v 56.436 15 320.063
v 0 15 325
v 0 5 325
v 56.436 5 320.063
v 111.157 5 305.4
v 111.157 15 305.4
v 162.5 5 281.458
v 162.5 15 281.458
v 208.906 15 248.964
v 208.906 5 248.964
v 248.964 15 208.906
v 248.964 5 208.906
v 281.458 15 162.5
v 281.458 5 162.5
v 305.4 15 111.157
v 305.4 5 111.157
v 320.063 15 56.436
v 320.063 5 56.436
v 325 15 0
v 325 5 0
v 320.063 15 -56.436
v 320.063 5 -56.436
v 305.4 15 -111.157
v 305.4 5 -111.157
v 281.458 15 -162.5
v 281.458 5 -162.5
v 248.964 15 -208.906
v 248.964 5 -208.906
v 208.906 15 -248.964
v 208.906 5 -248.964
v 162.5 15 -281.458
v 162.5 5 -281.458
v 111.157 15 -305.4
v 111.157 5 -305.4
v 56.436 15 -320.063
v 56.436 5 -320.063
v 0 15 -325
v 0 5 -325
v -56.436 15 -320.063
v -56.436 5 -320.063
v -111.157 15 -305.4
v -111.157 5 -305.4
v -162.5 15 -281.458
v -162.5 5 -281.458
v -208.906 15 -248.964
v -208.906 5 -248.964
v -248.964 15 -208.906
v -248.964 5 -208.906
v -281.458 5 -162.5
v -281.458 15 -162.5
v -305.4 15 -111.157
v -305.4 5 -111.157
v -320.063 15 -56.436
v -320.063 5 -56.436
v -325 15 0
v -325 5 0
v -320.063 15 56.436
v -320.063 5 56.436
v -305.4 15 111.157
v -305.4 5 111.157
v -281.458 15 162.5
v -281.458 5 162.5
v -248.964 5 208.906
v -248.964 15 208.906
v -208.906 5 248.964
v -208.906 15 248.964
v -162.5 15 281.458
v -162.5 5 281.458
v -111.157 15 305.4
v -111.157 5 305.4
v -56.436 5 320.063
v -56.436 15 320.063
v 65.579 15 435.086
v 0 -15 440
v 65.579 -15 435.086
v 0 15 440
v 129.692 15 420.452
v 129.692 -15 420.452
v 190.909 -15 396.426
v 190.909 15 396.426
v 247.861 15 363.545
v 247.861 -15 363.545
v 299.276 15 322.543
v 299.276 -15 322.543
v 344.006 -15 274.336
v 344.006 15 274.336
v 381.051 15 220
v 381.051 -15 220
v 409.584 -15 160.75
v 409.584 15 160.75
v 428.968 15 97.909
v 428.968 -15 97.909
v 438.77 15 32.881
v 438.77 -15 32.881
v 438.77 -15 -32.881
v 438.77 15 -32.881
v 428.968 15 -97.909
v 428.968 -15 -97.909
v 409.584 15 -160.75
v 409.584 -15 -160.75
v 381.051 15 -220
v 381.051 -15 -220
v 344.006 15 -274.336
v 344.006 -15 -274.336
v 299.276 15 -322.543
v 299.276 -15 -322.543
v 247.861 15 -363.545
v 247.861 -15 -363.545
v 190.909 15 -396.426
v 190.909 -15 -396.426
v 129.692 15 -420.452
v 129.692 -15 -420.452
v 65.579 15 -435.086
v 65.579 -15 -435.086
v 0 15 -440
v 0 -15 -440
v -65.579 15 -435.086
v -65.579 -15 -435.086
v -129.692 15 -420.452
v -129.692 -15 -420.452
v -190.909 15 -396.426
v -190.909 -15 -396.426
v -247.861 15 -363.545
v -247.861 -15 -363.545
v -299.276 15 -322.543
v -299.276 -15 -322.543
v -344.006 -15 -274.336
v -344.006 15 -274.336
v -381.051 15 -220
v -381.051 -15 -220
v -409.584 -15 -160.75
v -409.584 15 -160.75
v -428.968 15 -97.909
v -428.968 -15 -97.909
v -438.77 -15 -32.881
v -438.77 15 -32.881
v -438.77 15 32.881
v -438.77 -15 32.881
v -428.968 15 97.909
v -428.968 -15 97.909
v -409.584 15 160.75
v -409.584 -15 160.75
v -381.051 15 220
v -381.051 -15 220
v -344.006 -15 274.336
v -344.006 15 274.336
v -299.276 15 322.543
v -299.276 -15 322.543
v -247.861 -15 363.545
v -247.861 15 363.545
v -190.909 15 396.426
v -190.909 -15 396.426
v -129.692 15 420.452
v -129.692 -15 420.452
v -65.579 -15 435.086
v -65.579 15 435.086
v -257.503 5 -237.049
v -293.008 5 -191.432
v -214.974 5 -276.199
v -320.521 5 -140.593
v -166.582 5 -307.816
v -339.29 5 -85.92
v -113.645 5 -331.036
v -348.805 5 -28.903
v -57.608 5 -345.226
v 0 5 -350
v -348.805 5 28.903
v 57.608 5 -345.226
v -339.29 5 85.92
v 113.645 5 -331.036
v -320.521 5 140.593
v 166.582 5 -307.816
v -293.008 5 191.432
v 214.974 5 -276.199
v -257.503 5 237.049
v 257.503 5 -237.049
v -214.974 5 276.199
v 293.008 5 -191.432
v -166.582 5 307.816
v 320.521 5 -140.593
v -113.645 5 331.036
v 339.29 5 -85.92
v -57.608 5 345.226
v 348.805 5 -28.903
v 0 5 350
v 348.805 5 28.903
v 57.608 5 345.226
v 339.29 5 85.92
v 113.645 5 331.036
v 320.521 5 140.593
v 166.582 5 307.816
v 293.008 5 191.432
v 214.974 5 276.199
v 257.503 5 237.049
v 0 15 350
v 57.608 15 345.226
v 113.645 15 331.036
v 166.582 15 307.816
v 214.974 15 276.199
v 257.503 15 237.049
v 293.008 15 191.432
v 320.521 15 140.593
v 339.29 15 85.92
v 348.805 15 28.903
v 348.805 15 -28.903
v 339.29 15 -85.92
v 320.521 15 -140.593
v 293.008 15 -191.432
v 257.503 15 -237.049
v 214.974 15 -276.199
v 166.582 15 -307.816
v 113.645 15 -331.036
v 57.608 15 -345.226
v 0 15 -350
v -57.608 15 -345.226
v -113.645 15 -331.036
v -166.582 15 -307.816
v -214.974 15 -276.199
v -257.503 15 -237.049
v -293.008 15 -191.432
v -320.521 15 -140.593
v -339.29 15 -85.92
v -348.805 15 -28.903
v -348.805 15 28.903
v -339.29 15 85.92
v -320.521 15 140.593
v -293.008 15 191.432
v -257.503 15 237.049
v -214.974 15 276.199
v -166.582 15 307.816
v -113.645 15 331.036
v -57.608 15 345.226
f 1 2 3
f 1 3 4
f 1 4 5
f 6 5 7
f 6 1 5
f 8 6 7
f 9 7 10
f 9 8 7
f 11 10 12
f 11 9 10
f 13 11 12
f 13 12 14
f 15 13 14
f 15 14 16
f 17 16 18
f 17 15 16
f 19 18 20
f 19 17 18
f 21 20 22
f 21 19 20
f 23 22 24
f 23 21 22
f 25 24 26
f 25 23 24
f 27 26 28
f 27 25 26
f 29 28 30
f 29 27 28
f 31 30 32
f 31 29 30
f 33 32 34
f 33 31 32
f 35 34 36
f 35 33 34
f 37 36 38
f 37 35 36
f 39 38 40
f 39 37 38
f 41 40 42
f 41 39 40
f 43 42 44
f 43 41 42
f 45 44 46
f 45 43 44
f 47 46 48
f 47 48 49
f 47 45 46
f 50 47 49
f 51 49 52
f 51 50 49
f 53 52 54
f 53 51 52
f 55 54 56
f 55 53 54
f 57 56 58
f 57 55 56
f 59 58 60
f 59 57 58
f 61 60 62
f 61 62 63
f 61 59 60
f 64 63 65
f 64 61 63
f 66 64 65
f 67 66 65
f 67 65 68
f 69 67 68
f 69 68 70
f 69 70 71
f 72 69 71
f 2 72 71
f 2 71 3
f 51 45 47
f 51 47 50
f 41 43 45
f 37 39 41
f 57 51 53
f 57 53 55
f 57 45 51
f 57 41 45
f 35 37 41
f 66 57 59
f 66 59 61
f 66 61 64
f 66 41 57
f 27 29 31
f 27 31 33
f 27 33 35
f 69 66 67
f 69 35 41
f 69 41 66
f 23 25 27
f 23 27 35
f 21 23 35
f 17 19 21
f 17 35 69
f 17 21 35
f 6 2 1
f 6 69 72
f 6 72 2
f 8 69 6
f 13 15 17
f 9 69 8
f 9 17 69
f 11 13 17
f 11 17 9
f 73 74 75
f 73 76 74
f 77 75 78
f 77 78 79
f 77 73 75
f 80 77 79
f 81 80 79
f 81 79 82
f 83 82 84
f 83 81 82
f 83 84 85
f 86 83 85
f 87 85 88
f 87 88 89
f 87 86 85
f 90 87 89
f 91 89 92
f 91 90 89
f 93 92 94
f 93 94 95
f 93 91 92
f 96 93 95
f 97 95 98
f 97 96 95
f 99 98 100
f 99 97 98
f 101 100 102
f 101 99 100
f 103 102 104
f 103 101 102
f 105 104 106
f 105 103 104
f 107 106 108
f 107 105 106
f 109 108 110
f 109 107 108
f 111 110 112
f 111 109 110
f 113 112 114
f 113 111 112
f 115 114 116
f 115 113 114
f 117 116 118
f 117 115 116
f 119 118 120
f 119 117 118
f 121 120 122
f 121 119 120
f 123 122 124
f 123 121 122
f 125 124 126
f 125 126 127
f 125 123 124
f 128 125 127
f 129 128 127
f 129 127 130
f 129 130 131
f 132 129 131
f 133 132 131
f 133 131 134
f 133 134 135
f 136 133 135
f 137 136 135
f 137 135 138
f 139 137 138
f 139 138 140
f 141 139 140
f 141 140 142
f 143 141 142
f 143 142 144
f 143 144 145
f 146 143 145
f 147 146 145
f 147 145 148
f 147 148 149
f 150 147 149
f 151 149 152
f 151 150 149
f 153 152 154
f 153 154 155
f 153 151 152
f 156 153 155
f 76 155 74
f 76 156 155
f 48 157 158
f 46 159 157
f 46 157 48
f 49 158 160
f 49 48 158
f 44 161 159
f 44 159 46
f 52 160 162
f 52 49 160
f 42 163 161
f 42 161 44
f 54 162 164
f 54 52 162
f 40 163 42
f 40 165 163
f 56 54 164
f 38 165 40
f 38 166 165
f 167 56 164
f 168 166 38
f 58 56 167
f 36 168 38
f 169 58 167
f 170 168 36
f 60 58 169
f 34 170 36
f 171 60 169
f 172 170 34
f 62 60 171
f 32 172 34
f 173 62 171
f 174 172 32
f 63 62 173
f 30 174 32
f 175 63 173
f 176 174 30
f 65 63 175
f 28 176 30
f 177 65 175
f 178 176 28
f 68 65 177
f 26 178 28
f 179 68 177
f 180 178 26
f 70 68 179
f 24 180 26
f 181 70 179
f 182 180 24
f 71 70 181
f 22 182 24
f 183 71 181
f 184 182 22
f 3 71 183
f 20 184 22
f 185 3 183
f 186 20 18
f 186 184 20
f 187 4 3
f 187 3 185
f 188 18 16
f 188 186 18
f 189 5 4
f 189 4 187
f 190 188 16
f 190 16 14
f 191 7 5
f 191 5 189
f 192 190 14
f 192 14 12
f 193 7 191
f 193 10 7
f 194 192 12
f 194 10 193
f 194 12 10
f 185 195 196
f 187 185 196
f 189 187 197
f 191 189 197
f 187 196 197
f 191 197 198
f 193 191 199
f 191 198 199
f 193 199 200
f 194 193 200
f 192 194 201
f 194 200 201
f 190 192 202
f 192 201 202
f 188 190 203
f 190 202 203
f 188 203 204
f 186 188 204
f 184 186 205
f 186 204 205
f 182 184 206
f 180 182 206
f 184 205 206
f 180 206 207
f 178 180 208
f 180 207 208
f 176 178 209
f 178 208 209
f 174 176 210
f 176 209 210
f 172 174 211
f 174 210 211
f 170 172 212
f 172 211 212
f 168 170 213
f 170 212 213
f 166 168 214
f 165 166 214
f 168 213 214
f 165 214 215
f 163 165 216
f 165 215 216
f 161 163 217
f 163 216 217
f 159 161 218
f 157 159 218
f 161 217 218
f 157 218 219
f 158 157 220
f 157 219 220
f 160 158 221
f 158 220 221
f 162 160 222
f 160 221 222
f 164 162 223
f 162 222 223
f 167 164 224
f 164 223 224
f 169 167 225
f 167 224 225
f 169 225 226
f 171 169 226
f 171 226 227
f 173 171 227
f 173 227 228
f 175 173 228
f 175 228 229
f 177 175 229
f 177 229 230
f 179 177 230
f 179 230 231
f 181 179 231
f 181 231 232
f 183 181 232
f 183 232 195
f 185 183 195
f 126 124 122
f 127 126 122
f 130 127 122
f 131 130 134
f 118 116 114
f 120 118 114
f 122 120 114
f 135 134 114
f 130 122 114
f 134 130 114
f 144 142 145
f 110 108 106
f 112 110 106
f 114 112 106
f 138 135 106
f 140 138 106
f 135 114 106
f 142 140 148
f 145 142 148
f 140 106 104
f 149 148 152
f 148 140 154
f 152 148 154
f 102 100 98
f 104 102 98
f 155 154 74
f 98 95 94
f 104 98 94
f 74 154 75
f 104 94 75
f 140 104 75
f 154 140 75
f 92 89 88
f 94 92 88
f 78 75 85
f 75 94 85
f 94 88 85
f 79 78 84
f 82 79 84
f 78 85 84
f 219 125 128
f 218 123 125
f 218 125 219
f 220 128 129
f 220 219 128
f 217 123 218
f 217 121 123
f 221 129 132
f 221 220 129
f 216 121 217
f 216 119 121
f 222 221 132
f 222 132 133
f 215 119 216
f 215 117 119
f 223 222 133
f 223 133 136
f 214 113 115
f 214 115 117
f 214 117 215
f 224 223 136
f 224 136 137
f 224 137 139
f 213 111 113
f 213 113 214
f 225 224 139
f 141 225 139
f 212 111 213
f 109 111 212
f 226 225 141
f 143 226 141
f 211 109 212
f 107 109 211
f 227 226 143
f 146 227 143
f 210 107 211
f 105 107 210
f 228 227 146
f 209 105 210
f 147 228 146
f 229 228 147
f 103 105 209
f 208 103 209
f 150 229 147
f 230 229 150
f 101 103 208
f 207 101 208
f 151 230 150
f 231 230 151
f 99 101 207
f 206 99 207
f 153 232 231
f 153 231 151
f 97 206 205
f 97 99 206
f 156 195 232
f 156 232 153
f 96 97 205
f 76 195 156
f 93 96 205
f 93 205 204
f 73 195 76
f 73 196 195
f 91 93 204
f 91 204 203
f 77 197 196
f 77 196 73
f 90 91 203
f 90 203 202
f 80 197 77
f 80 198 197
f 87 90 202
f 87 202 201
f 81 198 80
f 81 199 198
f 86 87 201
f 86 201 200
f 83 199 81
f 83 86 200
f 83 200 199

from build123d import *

# Parameters (mm, degrees)
SKETCH1_R           = 440
BOSS_EXTRUDE1_DEPTH = 15
SKETCH2_R           = 350
SKETCH2_R_2         = 325
CUT_EXTRUDE1_DEPTH  = 10


with BuildPart() as part:
    # Sketch1 → Boss-Extrude1 (new, symmetric)
    with BuildSketch(Plane(origin=(0, 0, 0), x_dir=(1, 0, 0), z_dir=(0, 1, 0))):
        with Locations(Location((0, 0, 0), (0, 0, 270))):
            Circle(SKETCH1_R)
    extrude(amount=BOSS_EXTRUDE1_DEPTH, both=True)

    # Sketch2 → Cut-Extrude1 (cut)
    with BuildSketch(Plane(origin=(0, 15, 0), x_dir=(1, 0, 0), z_dir=(0, 1, 0))):
        with Locations(Location((0, 0, 0), (0, 0, 270))):
            Circle(SKETCH2_R)
        with Locations(Location((0, 0, 0), (0, 0, 270))):
            Circle(SKETCH2_R_2, mode=Mode.SUBTRACT)
    extrude(amount=-CUT_EXTRUDE1_DEPTH, mode=Mode.SUBTRACT)


solid = part.part
